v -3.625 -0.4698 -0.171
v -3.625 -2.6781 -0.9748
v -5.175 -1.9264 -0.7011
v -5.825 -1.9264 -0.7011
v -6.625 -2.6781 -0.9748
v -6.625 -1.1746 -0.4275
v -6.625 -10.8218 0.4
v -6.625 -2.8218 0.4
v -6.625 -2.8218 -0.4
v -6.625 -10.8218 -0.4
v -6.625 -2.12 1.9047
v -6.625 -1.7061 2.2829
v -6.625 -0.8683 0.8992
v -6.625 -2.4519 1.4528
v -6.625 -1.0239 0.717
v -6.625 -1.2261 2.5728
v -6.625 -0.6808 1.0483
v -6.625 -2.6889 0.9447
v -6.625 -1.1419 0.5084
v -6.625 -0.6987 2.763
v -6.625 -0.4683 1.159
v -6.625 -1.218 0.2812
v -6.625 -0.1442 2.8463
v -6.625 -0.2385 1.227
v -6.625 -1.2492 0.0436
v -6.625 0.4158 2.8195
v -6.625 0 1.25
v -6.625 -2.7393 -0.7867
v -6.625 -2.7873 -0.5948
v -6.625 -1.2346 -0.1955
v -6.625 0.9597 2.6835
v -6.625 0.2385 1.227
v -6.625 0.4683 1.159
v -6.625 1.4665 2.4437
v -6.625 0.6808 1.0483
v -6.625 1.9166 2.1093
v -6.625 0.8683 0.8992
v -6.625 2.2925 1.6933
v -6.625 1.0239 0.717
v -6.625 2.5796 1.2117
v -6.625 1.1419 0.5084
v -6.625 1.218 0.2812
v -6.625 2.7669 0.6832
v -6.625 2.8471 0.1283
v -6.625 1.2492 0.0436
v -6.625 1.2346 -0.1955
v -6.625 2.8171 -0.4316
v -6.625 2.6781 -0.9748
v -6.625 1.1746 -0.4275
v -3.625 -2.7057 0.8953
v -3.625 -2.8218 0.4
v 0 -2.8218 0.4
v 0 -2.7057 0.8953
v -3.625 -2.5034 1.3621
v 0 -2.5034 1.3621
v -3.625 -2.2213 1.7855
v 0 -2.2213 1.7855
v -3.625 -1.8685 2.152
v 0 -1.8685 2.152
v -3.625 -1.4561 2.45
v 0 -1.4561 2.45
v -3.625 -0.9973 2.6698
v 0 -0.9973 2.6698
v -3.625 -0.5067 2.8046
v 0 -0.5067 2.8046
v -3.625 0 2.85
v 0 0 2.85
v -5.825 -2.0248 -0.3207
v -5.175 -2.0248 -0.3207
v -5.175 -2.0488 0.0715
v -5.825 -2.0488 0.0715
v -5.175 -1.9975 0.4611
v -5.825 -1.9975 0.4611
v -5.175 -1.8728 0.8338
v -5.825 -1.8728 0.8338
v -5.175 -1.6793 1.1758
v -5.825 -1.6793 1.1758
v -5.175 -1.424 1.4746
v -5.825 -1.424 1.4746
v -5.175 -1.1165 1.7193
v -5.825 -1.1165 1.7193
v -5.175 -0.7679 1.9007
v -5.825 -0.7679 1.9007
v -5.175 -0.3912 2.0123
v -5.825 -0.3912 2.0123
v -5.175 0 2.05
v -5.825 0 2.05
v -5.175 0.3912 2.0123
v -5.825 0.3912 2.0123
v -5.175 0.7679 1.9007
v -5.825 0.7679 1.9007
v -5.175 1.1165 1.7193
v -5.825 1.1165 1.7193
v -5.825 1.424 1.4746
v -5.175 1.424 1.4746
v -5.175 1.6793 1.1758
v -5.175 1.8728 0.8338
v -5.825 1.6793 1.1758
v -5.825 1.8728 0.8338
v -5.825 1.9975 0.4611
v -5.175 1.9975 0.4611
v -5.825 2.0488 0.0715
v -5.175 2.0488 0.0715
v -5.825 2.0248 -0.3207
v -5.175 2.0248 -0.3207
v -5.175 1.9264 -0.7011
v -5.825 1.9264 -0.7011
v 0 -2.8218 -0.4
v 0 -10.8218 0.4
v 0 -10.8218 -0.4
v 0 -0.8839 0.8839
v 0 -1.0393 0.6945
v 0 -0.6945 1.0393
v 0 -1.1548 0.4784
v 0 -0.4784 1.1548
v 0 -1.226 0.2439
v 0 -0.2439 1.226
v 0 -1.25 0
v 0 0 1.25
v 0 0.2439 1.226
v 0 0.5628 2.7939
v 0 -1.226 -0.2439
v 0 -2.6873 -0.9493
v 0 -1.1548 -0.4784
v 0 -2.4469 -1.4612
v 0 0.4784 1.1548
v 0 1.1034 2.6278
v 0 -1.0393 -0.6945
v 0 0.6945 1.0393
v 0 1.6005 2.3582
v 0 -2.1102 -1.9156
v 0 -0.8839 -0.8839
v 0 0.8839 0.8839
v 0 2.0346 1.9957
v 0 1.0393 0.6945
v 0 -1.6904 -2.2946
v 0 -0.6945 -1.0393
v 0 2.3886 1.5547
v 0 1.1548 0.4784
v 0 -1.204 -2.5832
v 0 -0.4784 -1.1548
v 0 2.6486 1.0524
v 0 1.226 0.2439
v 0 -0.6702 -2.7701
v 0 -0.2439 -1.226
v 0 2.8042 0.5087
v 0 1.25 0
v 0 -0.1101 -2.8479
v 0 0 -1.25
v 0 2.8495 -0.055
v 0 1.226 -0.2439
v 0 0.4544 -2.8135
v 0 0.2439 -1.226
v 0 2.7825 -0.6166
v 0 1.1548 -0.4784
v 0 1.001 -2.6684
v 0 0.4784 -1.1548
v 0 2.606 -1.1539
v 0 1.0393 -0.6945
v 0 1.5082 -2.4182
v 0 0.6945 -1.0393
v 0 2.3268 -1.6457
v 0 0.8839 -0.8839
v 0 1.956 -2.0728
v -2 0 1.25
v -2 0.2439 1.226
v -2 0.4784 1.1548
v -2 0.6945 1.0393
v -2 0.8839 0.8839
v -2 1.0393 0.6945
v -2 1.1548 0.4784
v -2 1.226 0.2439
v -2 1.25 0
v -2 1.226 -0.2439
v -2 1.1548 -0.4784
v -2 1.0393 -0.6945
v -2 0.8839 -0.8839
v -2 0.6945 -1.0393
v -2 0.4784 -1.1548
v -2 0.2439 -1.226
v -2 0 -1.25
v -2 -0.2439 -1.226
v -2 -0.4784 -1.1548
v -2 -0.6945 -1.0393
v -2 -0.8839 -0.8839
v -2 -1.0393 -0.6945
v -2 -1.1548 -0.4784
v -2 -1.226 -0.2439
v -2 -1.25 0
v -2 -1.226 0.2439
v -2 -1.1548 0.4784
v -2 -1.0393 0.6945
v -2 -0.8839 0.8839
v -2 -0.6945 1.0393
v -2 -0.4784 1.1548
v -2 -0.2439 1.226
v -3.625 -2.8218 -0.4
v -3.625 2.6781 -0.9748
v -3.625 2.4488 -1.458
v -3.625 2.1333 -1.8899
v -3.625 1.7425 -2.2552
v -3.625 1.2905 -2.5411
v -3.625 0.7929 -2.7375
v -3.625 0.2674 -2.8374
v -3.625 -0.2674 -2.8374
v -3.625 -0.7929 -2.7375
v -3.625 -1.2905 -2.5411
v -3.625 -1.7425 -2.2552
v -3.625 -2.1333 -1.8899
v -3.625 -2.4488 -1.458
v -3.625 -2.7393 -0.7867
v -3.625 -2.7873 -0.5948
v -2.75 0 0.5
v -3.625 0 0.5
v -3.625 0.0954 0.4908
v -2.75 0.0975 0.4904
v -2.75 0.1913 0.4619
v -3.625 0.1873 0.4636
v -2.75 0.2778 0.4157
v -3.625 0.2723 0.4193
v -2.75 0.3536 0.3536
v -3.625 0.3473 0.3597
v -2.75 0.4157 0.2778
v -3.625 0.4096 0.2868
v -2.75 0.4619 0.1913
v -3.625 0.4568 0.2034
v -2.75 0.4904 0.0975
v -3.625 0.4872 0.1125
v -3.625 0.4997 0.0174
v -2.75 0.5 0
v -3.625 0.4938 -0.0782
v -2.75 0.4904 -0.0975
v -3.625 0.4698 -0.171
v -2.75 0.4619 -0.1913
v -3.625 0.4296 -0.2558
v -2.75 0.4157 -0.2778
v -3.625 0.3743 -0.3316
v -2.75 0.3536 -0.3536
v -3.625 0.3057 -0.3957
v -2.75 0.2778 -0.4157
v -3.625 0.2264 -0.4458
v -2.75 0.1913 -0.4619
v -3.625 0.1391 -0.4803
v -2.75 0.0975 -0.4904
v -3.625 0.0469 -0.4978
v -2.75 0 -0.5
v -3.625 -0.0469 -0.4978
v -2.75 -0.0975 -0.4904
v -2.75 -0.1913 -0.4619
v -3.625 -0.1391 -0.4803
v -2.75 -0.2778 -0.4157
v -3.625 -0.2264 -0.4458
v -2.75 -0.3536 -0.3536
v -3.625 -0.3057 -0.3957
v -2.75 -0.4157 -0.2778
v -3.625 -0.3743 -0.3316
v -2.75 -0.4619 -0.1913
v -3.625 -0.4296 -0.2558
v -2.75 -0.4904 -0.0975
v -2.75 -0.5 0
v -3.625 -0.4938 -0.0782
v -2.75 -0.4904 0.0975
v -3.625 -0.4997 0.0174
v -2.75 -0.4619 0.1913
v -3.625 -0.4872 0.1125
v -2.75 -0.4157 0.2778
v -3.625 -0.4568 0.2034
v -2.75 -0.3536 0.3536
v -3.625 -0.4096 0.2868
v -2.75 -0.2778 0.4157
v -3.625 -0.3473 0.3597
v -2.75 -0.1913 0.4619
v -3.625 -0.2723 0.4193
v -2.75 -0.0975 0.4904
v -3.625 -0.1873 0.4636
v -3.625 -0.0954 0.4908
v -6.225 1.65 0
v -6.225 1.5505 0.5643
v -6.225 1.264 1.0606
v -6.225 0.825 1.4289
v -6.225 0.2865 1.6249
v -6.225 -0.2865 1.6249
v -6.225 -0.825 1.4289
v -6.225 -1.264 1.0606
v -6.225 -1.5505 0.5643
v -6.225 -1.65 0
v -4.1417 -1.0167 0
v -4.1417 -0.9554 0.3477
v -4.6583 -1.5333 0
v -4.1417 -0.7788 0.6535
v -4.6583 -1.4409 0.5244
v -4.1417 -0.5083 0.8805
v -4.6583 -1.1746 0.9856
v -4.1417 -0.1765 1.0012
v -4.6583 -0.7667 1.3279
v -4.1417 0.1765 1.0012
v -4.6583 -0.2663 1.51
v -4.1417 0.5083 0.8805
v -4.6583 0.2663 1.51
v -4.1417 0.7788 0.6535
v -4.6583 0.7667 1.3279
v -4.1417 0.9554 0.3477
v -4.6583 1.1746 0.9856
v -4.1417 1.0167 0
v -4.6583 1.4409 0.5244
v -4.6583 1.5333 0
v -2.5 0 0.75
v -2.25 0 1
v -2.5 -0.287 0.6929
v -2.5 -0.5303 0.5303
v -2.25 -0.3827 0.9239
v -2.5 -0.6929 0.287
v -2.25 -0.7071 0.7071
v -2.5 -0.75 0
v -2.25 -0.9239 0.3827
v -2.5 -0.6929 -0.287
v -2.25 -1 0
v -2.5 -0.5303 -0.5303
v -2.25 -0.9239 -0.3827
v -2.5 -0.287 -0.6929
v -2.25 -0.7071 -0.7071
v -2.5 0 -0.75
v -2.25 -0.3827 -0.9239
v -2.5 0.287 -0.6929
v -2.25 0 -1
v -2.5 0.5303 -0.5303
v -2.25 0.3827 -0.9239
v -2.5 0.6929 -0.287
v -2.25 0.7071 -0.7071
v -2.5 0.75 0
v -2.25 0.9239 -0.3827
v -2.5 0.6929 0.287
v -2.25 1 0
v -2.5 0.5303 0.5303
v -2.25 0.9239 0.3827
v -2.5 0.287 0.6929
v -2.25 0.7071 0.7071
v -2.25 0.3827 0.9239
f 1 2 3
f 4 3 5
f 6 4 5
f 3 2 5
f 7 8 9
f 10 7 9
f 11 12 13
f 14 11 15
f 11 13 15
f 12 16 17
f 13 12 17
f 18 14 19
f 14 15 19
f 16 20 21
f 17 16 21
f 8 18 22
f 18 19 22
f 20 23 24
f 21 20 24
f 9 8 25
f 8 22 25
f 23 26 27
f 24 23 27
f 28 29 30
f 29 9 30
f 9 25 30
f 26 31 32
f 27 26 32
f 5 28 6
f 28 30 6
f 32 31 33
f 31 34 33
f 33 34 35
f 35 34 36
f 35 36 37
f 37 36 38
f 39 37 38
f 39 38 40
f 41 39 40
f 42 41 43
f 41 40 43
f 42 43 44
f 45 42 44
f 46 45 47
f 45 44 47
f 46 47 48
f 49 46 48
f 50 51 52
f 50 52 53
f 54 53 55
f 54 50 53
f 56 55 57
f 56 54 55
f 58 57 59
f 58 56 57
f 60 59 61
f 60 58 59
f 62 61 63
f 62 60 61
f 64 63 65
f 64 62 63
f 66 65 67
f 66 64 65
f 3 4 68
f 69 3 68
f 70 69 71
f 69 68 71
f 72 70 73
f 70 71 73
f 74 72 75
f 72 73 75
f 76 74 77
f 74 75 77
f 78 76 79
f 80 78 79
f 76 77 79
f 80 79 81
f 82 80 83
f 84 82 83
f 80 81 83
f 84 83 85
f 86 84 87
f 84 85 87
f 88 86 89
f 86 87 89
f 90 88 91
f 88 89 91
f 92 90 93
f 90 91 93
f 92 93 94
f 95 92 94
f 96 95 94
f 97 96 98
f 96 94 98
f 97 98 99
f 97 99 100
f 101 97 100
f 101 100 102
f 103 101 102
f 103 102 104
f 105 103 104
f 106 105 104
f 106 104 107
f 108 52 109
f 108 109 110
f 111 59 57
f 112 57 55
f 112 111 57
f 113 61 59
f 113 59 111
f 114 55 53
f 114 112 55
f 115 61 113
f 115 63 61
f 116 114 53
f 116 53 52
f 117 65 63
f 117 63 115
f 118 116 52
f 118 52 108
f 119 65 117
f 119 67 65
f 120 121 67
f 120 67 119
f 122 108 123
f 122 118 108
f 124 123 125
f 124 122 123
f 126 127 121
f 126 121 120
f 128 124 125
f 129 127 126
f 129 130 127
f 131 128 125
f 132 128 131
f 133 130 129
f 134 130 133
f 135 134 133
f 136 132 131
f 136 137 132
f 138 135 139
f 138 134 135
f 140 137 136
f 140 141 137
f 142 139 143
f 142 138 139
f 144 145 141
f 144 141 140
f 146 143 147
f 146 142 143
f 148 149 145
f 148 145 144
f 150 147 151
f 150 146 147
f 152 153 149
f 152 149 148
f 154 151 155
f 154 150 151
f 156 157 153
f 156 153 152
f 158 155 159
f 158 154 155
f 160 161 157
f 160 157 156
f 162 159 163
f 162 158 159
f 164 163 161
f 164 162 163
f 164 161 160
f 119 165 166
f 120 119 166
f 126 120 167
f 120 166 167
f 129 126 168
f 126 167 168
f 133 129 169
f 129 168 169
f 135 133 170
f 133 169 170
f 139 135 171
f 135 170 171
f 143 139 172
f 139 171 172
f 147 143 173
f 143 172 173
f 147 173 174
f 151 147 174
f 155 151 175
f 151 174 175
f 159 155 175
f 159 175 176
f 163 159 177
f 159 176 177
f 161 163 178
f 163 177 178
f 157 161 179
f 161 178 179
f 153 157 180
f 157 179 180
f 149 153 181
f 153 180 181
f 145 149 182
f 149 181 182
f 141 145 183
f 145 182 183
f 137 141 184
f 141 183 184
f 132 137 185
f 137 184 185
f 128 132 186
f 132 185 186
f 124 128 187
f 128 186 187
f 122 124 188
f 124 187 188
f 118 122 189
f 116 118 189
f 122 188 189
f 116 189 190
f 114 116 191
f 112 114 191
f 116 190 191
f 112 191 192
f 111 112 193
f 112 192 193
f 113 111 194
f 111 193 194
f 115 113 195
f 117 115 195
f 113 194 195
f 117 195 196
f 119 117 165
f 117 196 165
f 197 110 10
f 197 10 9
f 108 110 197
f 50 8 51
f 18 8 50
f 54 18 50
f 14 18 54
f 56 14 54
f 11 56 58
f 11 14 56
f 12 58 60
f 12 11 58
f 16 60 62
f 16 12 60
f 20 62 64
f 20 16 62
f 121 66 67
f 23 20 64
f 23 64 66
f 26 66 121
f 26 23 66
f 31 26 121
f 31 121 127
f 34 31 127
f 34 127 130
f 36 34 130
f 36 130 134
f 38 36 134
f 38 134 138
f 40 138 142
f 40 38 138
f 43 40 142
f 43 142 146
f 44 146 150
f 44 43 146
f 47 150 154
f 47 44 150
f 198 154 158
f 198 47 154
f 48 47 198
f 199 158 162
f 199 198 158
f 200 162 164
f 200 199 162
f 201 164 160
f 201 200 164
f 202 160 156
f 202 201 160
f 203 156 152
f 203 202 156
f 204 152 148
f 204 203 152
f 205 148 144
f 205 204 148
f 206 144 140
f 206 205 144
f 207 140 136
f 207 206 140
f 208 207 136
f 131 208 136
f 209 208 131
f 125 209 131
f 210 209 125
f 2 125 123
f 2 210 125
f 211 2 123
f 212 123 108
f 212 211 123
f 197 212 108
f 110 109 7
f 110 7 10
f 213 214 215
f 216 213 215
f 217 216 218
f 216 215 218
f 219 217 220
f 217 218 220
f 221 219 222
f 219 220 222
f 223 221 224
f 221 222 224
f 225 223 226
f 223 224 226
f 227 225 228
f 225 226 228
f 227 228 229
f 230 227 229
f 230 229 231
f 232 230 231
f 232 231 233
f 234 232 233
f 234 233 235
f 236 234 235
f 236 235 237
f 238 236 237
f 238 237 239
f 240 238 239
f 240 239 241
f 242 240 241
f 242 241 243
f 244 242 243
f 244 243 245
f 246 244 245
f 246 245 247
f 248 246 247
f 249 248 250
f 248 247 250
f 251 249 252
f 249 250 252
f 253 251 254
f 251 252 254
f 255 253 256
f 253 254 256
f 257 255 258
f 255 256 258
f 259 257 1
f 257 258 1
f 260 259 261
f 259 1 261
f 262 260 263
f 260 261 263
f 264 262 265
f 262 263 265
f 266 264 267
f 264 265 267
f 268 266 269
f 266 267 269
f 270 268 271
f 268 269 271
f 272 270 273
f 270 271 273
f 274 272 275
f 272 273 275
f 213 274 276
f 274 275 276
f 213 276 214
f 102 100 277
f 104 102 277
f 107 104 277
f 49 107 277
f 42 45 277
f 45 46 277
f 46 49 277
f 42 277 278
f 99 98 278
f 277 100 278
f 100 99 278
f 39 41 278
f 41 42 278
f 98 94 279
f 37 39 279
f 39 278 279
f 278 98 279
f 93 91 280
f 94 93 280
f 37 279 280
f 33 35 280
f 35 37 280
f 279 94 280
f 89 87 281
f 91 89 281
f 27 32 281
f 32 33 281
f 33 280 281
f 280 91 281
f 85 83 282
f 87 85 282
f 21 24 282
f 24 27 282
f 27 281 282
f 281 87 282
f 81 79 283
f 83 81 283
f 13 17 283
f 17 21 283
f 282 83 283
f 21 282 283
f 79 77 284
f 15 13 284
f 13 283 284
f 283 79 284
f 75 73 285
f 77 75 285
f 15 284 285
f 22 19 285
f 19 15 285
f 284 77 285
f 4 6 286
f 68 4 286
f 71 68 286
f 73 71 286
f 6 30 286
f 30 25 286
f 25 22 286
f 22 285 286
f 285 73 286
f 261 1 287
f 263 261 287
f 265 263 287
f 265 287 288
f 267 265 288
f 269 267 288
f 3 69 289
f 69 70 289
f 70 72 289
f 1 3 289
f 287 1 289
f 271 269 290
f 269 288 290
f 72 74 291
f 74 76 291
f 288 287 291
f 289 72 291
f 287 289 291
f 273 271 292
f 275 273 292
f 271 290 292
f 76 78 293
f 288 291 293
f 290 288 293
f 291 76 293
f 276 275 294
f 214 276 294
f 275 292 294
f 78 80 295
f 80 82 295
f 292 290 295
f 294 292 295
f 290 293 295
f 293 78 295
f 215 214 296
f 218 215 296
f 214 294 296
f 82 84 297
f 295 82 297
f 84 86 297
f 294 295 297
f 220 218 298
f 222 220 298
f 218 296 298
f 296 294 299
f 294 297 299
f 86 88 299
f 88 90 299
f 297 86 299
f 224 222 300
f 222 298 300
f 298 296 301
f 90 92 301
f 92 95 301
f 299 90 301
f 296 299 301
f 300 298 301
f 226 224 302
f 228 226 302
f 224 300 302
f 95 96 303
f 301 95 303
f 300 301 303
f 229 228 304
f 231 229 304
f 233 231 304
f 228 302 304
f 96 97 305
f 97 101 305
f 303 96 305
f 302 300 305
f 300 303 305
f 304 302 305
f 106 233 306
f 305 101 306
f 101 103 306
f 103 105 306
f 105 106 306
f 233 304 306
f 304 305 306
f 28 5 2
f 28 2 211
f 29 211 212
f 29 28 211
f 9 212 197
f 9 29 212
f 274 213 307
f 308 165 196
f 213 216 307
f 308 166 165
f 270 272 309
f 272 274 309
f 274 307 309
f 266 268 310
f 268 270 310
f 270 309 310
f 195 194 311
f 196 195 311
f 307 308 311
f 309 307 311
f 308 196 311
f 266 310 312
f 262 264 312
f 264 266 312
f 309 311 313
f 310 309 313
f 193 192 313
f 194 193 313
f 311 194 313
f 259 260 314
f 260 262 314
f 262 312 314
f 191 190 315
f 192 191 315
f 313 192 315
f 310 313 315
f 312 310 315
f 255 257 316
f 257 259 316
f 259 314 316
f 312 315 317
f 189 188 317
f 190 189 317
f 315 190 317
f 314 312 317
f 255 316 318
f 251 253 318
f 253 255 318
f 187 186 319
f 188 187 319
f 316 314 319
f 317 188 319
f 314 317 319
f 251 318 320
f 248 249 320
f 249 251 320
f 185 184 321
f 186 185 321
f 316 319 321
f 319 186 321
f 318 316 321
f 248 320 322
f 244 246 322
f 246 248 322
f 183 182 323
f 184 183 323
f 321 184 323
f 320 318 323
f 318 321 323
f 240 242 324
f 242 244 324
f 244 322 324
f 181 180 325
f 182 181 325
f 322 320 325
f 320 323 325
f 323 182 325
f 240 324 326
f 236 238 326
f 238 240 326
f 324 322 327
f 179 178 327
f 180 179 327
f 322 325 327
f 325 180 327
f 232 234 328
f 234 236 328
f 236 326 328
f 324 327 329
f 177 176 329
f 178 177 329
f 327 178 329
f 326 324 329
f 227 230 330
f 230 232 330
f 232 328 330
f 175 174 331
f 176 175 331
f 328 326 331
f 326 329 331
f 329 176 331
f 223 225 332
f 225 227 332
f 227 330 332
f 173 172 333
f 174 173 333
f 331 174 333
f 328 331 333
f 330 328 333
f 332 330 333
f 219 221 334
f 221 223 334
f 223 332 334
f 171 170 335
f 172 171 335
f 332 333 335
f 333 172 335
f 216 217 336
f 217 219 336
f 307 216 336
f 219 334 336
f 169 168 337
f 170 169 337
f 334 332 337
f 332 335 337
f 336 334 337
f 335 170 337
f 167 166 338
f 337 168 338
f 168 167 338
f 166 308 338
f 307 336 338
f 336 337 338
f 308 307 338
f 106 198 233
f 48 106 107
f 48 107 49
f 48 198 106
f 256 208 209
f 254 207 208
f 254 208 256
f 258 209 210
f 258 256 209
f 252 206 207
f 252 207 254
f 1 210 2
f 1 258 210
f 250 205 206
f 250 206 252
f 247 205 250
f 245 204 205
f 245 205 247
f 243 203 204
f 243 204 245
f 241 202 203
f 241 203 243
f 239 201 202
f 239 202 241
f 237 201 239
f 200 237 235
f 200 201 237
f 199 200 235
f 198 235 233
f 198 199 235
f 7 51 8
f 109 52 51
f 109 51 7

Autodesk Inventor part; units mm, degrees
ref_plane "YZ Plane" through (0, 0, 0) normal (1, 0, 0) x (0, 1, 0)
ref_plane "XZ Plane" through (0, 0, 0) normal (0, 1, 0) x (-1, 0, 0)
ref_plane "XY Plane" through (0, 0, 0) normal (0, 0, 1) x (1, 0, 0)
sketch "Sketch1" plane through (0, 0, 0) normal (0, 1, 0) x (-1, 0, 0)
  line L0 (1.5, -2.15) -> (2.25, -2.15)
  line L1 (4.15, -2.96) -> (-1, -2.96)
  line L2 (-1, -2.96) -> (-1, -5)
  line L3 (0.8364, -2.3) -> (-2, -2.3)
  line L4 (-1, -5) -> (-2, -5)
  line L5 (-2, -5) -> (-2, -2.3)
  line L6 (-0.8, -0.5) -> (0.8364, -2.3)
  line L7 (0, 0) -> (-5, 0) construction
  line L8 (1.5, -2.15) -> (0, -0.5)
  line L9 (0, -0.5) -> (-0.8, -0.5)
  line L10 (2.25, -2.15) -> (3.25, -0.5)
  line L11 (3.25, -0.5) -> (4.05, -0.5)
  line L12 (4.05, -0.5) -> (4.15, -2.96)
  dimension "d0" = 2.3
  dimension "d4" = 2.15
  dimension "d5" = 0.75
  dimension "d9" = 0.81
  dimension "d10" = 1
  dimension "d11" = 5
  dimension "d22" = 0.8
  dimension "d27" = 0.8
  dimension "d45" = 3.5
  dimension "d47" = 1.5
  dimension "d48" = 0.1
  dimension "d54" = 0.5
  dimension "d55" = 1
sketch "Sketch4" plane through (0, 0, 0) normal (0, 1, 0) x (-1, 0, 0)
  line L0 (0, 1.25) -> (0, 2.85)
  line L1 (0, 2.85) -> (6.625, 2.85)
  line L2 (6.625, 2.85) -> (6.625, 1.25)
  line L3 (3.625, 0.5) -> (5.175, 2.05)
  line L4 (5.175, 2.05) -> (5.825, 2.05)
  line L5 (5.825, 2.05) -> (6.625, 1.25)
  line L6 (0, 1.25) -> (2, 1.25)
  line L7 (2, 1.25) -> (2.75, 0.5)
  line L8 (2.75, 0.5) -> (3.625, 0.5)
  line L9 (3.625, 0.5) -> (3.625, 2.85)
  line L10 (0, 0) -> (1.5, 0)
  point P0 (5.5, 2.05)
  dimension "d56" = 1.25
  dimension "d57" = 2
  dimension "d58" = 135
  dimension "d59" = 0.5
  dimension "d61" = 2.05
  dimension "d62" = 0.65
  dimension "d63" = 0.8
  dimension "d65" = 3.5
  dimension "d68" = 1.6
revolve "Revolution5" add sketch "Sketch4" angle 360 about axis through (0, 0, 0) along (-1, 0, 0) contours L0 L1 L9 L8 L7 L6
revolve "Revolution6" add sketch "Sketch4" angle 220 mid plane about axis through (0, 0, 0) along (-1, 0, 0)
sketch "Sketch5" plane through (0, 0, 0) normal (1, 0, 0) x (0, 0, -1)
  circle A0 centre (0, 0) radius 2.85 projected
  line L0 (-0.4, 2.8218) -> (-0.4, 10.8218)
  line L1 (-0.4, 10.8218) -> (0.4, 10.8218)
  line L2 (0.4, 10.8218) -> (0.4, 2.8218)
  arc A1 (0.9748, 2.6781) -> (0.9748, -2.6781) centre (0, 0) ccw projected
  line L3 (-2.8218, -0.4) -> (-10.8218, -0.4)
  line L4 (-10.8218, -0.4) -> (-10.8218, 0.4)
  line L5 (-10.8218, 0.4) -> (-2.8218, 0.4)
  line L6 (-0.4, -2.8218) -> (-0.4, -10.8218)
  line L7 (-0.4, -10.8218) -> (0.4, -10.8218)
  line L8 (0.4, -10.8218) -> (0.4, -2.8218)
  point P0 (-2.8218, 0.4)
  point P1 (0.4, -2.8218)
  dimension "d69" = 0.8
  dimension "d70" = 8
  dimension "d15" = 1.2
  dimension "d30" = 1.2
  dimension "d31" = 1.2
  dimension "d34" = 3.5
  dimension "d50" = 120
  dimension "d51" = 0.8
extrude "Extrusion5" add sketch "Sketch5" against normal up to surface (6.625 mm away) contours L8 L7 L6 A0
sketch "Sketch3" plane through (-9.15, 0, 0) normal (-1, 0, 0) x (0, 1, 0)
  arc A0 (1, 0.4583) -> (0, -1.1) centre (0, 0) ccw projected
  arc A1 (1, 0.4583) -> (0, -1.1) centre (0, 0) ccw projected
  arc A2 (1.0439, -0.3469) -> (-1.0439, -0.3469) centre (0, 2.5349) ccw
  arc A3 (0.6833, -0.8621) -> (-0.6833, -0.8621) centre (0, 2.5349) ccw
  circle A4 centre (0, 0) radius 6 projected
  dimension "d42" = 0.4
properties part number "adjustable_collimator"
